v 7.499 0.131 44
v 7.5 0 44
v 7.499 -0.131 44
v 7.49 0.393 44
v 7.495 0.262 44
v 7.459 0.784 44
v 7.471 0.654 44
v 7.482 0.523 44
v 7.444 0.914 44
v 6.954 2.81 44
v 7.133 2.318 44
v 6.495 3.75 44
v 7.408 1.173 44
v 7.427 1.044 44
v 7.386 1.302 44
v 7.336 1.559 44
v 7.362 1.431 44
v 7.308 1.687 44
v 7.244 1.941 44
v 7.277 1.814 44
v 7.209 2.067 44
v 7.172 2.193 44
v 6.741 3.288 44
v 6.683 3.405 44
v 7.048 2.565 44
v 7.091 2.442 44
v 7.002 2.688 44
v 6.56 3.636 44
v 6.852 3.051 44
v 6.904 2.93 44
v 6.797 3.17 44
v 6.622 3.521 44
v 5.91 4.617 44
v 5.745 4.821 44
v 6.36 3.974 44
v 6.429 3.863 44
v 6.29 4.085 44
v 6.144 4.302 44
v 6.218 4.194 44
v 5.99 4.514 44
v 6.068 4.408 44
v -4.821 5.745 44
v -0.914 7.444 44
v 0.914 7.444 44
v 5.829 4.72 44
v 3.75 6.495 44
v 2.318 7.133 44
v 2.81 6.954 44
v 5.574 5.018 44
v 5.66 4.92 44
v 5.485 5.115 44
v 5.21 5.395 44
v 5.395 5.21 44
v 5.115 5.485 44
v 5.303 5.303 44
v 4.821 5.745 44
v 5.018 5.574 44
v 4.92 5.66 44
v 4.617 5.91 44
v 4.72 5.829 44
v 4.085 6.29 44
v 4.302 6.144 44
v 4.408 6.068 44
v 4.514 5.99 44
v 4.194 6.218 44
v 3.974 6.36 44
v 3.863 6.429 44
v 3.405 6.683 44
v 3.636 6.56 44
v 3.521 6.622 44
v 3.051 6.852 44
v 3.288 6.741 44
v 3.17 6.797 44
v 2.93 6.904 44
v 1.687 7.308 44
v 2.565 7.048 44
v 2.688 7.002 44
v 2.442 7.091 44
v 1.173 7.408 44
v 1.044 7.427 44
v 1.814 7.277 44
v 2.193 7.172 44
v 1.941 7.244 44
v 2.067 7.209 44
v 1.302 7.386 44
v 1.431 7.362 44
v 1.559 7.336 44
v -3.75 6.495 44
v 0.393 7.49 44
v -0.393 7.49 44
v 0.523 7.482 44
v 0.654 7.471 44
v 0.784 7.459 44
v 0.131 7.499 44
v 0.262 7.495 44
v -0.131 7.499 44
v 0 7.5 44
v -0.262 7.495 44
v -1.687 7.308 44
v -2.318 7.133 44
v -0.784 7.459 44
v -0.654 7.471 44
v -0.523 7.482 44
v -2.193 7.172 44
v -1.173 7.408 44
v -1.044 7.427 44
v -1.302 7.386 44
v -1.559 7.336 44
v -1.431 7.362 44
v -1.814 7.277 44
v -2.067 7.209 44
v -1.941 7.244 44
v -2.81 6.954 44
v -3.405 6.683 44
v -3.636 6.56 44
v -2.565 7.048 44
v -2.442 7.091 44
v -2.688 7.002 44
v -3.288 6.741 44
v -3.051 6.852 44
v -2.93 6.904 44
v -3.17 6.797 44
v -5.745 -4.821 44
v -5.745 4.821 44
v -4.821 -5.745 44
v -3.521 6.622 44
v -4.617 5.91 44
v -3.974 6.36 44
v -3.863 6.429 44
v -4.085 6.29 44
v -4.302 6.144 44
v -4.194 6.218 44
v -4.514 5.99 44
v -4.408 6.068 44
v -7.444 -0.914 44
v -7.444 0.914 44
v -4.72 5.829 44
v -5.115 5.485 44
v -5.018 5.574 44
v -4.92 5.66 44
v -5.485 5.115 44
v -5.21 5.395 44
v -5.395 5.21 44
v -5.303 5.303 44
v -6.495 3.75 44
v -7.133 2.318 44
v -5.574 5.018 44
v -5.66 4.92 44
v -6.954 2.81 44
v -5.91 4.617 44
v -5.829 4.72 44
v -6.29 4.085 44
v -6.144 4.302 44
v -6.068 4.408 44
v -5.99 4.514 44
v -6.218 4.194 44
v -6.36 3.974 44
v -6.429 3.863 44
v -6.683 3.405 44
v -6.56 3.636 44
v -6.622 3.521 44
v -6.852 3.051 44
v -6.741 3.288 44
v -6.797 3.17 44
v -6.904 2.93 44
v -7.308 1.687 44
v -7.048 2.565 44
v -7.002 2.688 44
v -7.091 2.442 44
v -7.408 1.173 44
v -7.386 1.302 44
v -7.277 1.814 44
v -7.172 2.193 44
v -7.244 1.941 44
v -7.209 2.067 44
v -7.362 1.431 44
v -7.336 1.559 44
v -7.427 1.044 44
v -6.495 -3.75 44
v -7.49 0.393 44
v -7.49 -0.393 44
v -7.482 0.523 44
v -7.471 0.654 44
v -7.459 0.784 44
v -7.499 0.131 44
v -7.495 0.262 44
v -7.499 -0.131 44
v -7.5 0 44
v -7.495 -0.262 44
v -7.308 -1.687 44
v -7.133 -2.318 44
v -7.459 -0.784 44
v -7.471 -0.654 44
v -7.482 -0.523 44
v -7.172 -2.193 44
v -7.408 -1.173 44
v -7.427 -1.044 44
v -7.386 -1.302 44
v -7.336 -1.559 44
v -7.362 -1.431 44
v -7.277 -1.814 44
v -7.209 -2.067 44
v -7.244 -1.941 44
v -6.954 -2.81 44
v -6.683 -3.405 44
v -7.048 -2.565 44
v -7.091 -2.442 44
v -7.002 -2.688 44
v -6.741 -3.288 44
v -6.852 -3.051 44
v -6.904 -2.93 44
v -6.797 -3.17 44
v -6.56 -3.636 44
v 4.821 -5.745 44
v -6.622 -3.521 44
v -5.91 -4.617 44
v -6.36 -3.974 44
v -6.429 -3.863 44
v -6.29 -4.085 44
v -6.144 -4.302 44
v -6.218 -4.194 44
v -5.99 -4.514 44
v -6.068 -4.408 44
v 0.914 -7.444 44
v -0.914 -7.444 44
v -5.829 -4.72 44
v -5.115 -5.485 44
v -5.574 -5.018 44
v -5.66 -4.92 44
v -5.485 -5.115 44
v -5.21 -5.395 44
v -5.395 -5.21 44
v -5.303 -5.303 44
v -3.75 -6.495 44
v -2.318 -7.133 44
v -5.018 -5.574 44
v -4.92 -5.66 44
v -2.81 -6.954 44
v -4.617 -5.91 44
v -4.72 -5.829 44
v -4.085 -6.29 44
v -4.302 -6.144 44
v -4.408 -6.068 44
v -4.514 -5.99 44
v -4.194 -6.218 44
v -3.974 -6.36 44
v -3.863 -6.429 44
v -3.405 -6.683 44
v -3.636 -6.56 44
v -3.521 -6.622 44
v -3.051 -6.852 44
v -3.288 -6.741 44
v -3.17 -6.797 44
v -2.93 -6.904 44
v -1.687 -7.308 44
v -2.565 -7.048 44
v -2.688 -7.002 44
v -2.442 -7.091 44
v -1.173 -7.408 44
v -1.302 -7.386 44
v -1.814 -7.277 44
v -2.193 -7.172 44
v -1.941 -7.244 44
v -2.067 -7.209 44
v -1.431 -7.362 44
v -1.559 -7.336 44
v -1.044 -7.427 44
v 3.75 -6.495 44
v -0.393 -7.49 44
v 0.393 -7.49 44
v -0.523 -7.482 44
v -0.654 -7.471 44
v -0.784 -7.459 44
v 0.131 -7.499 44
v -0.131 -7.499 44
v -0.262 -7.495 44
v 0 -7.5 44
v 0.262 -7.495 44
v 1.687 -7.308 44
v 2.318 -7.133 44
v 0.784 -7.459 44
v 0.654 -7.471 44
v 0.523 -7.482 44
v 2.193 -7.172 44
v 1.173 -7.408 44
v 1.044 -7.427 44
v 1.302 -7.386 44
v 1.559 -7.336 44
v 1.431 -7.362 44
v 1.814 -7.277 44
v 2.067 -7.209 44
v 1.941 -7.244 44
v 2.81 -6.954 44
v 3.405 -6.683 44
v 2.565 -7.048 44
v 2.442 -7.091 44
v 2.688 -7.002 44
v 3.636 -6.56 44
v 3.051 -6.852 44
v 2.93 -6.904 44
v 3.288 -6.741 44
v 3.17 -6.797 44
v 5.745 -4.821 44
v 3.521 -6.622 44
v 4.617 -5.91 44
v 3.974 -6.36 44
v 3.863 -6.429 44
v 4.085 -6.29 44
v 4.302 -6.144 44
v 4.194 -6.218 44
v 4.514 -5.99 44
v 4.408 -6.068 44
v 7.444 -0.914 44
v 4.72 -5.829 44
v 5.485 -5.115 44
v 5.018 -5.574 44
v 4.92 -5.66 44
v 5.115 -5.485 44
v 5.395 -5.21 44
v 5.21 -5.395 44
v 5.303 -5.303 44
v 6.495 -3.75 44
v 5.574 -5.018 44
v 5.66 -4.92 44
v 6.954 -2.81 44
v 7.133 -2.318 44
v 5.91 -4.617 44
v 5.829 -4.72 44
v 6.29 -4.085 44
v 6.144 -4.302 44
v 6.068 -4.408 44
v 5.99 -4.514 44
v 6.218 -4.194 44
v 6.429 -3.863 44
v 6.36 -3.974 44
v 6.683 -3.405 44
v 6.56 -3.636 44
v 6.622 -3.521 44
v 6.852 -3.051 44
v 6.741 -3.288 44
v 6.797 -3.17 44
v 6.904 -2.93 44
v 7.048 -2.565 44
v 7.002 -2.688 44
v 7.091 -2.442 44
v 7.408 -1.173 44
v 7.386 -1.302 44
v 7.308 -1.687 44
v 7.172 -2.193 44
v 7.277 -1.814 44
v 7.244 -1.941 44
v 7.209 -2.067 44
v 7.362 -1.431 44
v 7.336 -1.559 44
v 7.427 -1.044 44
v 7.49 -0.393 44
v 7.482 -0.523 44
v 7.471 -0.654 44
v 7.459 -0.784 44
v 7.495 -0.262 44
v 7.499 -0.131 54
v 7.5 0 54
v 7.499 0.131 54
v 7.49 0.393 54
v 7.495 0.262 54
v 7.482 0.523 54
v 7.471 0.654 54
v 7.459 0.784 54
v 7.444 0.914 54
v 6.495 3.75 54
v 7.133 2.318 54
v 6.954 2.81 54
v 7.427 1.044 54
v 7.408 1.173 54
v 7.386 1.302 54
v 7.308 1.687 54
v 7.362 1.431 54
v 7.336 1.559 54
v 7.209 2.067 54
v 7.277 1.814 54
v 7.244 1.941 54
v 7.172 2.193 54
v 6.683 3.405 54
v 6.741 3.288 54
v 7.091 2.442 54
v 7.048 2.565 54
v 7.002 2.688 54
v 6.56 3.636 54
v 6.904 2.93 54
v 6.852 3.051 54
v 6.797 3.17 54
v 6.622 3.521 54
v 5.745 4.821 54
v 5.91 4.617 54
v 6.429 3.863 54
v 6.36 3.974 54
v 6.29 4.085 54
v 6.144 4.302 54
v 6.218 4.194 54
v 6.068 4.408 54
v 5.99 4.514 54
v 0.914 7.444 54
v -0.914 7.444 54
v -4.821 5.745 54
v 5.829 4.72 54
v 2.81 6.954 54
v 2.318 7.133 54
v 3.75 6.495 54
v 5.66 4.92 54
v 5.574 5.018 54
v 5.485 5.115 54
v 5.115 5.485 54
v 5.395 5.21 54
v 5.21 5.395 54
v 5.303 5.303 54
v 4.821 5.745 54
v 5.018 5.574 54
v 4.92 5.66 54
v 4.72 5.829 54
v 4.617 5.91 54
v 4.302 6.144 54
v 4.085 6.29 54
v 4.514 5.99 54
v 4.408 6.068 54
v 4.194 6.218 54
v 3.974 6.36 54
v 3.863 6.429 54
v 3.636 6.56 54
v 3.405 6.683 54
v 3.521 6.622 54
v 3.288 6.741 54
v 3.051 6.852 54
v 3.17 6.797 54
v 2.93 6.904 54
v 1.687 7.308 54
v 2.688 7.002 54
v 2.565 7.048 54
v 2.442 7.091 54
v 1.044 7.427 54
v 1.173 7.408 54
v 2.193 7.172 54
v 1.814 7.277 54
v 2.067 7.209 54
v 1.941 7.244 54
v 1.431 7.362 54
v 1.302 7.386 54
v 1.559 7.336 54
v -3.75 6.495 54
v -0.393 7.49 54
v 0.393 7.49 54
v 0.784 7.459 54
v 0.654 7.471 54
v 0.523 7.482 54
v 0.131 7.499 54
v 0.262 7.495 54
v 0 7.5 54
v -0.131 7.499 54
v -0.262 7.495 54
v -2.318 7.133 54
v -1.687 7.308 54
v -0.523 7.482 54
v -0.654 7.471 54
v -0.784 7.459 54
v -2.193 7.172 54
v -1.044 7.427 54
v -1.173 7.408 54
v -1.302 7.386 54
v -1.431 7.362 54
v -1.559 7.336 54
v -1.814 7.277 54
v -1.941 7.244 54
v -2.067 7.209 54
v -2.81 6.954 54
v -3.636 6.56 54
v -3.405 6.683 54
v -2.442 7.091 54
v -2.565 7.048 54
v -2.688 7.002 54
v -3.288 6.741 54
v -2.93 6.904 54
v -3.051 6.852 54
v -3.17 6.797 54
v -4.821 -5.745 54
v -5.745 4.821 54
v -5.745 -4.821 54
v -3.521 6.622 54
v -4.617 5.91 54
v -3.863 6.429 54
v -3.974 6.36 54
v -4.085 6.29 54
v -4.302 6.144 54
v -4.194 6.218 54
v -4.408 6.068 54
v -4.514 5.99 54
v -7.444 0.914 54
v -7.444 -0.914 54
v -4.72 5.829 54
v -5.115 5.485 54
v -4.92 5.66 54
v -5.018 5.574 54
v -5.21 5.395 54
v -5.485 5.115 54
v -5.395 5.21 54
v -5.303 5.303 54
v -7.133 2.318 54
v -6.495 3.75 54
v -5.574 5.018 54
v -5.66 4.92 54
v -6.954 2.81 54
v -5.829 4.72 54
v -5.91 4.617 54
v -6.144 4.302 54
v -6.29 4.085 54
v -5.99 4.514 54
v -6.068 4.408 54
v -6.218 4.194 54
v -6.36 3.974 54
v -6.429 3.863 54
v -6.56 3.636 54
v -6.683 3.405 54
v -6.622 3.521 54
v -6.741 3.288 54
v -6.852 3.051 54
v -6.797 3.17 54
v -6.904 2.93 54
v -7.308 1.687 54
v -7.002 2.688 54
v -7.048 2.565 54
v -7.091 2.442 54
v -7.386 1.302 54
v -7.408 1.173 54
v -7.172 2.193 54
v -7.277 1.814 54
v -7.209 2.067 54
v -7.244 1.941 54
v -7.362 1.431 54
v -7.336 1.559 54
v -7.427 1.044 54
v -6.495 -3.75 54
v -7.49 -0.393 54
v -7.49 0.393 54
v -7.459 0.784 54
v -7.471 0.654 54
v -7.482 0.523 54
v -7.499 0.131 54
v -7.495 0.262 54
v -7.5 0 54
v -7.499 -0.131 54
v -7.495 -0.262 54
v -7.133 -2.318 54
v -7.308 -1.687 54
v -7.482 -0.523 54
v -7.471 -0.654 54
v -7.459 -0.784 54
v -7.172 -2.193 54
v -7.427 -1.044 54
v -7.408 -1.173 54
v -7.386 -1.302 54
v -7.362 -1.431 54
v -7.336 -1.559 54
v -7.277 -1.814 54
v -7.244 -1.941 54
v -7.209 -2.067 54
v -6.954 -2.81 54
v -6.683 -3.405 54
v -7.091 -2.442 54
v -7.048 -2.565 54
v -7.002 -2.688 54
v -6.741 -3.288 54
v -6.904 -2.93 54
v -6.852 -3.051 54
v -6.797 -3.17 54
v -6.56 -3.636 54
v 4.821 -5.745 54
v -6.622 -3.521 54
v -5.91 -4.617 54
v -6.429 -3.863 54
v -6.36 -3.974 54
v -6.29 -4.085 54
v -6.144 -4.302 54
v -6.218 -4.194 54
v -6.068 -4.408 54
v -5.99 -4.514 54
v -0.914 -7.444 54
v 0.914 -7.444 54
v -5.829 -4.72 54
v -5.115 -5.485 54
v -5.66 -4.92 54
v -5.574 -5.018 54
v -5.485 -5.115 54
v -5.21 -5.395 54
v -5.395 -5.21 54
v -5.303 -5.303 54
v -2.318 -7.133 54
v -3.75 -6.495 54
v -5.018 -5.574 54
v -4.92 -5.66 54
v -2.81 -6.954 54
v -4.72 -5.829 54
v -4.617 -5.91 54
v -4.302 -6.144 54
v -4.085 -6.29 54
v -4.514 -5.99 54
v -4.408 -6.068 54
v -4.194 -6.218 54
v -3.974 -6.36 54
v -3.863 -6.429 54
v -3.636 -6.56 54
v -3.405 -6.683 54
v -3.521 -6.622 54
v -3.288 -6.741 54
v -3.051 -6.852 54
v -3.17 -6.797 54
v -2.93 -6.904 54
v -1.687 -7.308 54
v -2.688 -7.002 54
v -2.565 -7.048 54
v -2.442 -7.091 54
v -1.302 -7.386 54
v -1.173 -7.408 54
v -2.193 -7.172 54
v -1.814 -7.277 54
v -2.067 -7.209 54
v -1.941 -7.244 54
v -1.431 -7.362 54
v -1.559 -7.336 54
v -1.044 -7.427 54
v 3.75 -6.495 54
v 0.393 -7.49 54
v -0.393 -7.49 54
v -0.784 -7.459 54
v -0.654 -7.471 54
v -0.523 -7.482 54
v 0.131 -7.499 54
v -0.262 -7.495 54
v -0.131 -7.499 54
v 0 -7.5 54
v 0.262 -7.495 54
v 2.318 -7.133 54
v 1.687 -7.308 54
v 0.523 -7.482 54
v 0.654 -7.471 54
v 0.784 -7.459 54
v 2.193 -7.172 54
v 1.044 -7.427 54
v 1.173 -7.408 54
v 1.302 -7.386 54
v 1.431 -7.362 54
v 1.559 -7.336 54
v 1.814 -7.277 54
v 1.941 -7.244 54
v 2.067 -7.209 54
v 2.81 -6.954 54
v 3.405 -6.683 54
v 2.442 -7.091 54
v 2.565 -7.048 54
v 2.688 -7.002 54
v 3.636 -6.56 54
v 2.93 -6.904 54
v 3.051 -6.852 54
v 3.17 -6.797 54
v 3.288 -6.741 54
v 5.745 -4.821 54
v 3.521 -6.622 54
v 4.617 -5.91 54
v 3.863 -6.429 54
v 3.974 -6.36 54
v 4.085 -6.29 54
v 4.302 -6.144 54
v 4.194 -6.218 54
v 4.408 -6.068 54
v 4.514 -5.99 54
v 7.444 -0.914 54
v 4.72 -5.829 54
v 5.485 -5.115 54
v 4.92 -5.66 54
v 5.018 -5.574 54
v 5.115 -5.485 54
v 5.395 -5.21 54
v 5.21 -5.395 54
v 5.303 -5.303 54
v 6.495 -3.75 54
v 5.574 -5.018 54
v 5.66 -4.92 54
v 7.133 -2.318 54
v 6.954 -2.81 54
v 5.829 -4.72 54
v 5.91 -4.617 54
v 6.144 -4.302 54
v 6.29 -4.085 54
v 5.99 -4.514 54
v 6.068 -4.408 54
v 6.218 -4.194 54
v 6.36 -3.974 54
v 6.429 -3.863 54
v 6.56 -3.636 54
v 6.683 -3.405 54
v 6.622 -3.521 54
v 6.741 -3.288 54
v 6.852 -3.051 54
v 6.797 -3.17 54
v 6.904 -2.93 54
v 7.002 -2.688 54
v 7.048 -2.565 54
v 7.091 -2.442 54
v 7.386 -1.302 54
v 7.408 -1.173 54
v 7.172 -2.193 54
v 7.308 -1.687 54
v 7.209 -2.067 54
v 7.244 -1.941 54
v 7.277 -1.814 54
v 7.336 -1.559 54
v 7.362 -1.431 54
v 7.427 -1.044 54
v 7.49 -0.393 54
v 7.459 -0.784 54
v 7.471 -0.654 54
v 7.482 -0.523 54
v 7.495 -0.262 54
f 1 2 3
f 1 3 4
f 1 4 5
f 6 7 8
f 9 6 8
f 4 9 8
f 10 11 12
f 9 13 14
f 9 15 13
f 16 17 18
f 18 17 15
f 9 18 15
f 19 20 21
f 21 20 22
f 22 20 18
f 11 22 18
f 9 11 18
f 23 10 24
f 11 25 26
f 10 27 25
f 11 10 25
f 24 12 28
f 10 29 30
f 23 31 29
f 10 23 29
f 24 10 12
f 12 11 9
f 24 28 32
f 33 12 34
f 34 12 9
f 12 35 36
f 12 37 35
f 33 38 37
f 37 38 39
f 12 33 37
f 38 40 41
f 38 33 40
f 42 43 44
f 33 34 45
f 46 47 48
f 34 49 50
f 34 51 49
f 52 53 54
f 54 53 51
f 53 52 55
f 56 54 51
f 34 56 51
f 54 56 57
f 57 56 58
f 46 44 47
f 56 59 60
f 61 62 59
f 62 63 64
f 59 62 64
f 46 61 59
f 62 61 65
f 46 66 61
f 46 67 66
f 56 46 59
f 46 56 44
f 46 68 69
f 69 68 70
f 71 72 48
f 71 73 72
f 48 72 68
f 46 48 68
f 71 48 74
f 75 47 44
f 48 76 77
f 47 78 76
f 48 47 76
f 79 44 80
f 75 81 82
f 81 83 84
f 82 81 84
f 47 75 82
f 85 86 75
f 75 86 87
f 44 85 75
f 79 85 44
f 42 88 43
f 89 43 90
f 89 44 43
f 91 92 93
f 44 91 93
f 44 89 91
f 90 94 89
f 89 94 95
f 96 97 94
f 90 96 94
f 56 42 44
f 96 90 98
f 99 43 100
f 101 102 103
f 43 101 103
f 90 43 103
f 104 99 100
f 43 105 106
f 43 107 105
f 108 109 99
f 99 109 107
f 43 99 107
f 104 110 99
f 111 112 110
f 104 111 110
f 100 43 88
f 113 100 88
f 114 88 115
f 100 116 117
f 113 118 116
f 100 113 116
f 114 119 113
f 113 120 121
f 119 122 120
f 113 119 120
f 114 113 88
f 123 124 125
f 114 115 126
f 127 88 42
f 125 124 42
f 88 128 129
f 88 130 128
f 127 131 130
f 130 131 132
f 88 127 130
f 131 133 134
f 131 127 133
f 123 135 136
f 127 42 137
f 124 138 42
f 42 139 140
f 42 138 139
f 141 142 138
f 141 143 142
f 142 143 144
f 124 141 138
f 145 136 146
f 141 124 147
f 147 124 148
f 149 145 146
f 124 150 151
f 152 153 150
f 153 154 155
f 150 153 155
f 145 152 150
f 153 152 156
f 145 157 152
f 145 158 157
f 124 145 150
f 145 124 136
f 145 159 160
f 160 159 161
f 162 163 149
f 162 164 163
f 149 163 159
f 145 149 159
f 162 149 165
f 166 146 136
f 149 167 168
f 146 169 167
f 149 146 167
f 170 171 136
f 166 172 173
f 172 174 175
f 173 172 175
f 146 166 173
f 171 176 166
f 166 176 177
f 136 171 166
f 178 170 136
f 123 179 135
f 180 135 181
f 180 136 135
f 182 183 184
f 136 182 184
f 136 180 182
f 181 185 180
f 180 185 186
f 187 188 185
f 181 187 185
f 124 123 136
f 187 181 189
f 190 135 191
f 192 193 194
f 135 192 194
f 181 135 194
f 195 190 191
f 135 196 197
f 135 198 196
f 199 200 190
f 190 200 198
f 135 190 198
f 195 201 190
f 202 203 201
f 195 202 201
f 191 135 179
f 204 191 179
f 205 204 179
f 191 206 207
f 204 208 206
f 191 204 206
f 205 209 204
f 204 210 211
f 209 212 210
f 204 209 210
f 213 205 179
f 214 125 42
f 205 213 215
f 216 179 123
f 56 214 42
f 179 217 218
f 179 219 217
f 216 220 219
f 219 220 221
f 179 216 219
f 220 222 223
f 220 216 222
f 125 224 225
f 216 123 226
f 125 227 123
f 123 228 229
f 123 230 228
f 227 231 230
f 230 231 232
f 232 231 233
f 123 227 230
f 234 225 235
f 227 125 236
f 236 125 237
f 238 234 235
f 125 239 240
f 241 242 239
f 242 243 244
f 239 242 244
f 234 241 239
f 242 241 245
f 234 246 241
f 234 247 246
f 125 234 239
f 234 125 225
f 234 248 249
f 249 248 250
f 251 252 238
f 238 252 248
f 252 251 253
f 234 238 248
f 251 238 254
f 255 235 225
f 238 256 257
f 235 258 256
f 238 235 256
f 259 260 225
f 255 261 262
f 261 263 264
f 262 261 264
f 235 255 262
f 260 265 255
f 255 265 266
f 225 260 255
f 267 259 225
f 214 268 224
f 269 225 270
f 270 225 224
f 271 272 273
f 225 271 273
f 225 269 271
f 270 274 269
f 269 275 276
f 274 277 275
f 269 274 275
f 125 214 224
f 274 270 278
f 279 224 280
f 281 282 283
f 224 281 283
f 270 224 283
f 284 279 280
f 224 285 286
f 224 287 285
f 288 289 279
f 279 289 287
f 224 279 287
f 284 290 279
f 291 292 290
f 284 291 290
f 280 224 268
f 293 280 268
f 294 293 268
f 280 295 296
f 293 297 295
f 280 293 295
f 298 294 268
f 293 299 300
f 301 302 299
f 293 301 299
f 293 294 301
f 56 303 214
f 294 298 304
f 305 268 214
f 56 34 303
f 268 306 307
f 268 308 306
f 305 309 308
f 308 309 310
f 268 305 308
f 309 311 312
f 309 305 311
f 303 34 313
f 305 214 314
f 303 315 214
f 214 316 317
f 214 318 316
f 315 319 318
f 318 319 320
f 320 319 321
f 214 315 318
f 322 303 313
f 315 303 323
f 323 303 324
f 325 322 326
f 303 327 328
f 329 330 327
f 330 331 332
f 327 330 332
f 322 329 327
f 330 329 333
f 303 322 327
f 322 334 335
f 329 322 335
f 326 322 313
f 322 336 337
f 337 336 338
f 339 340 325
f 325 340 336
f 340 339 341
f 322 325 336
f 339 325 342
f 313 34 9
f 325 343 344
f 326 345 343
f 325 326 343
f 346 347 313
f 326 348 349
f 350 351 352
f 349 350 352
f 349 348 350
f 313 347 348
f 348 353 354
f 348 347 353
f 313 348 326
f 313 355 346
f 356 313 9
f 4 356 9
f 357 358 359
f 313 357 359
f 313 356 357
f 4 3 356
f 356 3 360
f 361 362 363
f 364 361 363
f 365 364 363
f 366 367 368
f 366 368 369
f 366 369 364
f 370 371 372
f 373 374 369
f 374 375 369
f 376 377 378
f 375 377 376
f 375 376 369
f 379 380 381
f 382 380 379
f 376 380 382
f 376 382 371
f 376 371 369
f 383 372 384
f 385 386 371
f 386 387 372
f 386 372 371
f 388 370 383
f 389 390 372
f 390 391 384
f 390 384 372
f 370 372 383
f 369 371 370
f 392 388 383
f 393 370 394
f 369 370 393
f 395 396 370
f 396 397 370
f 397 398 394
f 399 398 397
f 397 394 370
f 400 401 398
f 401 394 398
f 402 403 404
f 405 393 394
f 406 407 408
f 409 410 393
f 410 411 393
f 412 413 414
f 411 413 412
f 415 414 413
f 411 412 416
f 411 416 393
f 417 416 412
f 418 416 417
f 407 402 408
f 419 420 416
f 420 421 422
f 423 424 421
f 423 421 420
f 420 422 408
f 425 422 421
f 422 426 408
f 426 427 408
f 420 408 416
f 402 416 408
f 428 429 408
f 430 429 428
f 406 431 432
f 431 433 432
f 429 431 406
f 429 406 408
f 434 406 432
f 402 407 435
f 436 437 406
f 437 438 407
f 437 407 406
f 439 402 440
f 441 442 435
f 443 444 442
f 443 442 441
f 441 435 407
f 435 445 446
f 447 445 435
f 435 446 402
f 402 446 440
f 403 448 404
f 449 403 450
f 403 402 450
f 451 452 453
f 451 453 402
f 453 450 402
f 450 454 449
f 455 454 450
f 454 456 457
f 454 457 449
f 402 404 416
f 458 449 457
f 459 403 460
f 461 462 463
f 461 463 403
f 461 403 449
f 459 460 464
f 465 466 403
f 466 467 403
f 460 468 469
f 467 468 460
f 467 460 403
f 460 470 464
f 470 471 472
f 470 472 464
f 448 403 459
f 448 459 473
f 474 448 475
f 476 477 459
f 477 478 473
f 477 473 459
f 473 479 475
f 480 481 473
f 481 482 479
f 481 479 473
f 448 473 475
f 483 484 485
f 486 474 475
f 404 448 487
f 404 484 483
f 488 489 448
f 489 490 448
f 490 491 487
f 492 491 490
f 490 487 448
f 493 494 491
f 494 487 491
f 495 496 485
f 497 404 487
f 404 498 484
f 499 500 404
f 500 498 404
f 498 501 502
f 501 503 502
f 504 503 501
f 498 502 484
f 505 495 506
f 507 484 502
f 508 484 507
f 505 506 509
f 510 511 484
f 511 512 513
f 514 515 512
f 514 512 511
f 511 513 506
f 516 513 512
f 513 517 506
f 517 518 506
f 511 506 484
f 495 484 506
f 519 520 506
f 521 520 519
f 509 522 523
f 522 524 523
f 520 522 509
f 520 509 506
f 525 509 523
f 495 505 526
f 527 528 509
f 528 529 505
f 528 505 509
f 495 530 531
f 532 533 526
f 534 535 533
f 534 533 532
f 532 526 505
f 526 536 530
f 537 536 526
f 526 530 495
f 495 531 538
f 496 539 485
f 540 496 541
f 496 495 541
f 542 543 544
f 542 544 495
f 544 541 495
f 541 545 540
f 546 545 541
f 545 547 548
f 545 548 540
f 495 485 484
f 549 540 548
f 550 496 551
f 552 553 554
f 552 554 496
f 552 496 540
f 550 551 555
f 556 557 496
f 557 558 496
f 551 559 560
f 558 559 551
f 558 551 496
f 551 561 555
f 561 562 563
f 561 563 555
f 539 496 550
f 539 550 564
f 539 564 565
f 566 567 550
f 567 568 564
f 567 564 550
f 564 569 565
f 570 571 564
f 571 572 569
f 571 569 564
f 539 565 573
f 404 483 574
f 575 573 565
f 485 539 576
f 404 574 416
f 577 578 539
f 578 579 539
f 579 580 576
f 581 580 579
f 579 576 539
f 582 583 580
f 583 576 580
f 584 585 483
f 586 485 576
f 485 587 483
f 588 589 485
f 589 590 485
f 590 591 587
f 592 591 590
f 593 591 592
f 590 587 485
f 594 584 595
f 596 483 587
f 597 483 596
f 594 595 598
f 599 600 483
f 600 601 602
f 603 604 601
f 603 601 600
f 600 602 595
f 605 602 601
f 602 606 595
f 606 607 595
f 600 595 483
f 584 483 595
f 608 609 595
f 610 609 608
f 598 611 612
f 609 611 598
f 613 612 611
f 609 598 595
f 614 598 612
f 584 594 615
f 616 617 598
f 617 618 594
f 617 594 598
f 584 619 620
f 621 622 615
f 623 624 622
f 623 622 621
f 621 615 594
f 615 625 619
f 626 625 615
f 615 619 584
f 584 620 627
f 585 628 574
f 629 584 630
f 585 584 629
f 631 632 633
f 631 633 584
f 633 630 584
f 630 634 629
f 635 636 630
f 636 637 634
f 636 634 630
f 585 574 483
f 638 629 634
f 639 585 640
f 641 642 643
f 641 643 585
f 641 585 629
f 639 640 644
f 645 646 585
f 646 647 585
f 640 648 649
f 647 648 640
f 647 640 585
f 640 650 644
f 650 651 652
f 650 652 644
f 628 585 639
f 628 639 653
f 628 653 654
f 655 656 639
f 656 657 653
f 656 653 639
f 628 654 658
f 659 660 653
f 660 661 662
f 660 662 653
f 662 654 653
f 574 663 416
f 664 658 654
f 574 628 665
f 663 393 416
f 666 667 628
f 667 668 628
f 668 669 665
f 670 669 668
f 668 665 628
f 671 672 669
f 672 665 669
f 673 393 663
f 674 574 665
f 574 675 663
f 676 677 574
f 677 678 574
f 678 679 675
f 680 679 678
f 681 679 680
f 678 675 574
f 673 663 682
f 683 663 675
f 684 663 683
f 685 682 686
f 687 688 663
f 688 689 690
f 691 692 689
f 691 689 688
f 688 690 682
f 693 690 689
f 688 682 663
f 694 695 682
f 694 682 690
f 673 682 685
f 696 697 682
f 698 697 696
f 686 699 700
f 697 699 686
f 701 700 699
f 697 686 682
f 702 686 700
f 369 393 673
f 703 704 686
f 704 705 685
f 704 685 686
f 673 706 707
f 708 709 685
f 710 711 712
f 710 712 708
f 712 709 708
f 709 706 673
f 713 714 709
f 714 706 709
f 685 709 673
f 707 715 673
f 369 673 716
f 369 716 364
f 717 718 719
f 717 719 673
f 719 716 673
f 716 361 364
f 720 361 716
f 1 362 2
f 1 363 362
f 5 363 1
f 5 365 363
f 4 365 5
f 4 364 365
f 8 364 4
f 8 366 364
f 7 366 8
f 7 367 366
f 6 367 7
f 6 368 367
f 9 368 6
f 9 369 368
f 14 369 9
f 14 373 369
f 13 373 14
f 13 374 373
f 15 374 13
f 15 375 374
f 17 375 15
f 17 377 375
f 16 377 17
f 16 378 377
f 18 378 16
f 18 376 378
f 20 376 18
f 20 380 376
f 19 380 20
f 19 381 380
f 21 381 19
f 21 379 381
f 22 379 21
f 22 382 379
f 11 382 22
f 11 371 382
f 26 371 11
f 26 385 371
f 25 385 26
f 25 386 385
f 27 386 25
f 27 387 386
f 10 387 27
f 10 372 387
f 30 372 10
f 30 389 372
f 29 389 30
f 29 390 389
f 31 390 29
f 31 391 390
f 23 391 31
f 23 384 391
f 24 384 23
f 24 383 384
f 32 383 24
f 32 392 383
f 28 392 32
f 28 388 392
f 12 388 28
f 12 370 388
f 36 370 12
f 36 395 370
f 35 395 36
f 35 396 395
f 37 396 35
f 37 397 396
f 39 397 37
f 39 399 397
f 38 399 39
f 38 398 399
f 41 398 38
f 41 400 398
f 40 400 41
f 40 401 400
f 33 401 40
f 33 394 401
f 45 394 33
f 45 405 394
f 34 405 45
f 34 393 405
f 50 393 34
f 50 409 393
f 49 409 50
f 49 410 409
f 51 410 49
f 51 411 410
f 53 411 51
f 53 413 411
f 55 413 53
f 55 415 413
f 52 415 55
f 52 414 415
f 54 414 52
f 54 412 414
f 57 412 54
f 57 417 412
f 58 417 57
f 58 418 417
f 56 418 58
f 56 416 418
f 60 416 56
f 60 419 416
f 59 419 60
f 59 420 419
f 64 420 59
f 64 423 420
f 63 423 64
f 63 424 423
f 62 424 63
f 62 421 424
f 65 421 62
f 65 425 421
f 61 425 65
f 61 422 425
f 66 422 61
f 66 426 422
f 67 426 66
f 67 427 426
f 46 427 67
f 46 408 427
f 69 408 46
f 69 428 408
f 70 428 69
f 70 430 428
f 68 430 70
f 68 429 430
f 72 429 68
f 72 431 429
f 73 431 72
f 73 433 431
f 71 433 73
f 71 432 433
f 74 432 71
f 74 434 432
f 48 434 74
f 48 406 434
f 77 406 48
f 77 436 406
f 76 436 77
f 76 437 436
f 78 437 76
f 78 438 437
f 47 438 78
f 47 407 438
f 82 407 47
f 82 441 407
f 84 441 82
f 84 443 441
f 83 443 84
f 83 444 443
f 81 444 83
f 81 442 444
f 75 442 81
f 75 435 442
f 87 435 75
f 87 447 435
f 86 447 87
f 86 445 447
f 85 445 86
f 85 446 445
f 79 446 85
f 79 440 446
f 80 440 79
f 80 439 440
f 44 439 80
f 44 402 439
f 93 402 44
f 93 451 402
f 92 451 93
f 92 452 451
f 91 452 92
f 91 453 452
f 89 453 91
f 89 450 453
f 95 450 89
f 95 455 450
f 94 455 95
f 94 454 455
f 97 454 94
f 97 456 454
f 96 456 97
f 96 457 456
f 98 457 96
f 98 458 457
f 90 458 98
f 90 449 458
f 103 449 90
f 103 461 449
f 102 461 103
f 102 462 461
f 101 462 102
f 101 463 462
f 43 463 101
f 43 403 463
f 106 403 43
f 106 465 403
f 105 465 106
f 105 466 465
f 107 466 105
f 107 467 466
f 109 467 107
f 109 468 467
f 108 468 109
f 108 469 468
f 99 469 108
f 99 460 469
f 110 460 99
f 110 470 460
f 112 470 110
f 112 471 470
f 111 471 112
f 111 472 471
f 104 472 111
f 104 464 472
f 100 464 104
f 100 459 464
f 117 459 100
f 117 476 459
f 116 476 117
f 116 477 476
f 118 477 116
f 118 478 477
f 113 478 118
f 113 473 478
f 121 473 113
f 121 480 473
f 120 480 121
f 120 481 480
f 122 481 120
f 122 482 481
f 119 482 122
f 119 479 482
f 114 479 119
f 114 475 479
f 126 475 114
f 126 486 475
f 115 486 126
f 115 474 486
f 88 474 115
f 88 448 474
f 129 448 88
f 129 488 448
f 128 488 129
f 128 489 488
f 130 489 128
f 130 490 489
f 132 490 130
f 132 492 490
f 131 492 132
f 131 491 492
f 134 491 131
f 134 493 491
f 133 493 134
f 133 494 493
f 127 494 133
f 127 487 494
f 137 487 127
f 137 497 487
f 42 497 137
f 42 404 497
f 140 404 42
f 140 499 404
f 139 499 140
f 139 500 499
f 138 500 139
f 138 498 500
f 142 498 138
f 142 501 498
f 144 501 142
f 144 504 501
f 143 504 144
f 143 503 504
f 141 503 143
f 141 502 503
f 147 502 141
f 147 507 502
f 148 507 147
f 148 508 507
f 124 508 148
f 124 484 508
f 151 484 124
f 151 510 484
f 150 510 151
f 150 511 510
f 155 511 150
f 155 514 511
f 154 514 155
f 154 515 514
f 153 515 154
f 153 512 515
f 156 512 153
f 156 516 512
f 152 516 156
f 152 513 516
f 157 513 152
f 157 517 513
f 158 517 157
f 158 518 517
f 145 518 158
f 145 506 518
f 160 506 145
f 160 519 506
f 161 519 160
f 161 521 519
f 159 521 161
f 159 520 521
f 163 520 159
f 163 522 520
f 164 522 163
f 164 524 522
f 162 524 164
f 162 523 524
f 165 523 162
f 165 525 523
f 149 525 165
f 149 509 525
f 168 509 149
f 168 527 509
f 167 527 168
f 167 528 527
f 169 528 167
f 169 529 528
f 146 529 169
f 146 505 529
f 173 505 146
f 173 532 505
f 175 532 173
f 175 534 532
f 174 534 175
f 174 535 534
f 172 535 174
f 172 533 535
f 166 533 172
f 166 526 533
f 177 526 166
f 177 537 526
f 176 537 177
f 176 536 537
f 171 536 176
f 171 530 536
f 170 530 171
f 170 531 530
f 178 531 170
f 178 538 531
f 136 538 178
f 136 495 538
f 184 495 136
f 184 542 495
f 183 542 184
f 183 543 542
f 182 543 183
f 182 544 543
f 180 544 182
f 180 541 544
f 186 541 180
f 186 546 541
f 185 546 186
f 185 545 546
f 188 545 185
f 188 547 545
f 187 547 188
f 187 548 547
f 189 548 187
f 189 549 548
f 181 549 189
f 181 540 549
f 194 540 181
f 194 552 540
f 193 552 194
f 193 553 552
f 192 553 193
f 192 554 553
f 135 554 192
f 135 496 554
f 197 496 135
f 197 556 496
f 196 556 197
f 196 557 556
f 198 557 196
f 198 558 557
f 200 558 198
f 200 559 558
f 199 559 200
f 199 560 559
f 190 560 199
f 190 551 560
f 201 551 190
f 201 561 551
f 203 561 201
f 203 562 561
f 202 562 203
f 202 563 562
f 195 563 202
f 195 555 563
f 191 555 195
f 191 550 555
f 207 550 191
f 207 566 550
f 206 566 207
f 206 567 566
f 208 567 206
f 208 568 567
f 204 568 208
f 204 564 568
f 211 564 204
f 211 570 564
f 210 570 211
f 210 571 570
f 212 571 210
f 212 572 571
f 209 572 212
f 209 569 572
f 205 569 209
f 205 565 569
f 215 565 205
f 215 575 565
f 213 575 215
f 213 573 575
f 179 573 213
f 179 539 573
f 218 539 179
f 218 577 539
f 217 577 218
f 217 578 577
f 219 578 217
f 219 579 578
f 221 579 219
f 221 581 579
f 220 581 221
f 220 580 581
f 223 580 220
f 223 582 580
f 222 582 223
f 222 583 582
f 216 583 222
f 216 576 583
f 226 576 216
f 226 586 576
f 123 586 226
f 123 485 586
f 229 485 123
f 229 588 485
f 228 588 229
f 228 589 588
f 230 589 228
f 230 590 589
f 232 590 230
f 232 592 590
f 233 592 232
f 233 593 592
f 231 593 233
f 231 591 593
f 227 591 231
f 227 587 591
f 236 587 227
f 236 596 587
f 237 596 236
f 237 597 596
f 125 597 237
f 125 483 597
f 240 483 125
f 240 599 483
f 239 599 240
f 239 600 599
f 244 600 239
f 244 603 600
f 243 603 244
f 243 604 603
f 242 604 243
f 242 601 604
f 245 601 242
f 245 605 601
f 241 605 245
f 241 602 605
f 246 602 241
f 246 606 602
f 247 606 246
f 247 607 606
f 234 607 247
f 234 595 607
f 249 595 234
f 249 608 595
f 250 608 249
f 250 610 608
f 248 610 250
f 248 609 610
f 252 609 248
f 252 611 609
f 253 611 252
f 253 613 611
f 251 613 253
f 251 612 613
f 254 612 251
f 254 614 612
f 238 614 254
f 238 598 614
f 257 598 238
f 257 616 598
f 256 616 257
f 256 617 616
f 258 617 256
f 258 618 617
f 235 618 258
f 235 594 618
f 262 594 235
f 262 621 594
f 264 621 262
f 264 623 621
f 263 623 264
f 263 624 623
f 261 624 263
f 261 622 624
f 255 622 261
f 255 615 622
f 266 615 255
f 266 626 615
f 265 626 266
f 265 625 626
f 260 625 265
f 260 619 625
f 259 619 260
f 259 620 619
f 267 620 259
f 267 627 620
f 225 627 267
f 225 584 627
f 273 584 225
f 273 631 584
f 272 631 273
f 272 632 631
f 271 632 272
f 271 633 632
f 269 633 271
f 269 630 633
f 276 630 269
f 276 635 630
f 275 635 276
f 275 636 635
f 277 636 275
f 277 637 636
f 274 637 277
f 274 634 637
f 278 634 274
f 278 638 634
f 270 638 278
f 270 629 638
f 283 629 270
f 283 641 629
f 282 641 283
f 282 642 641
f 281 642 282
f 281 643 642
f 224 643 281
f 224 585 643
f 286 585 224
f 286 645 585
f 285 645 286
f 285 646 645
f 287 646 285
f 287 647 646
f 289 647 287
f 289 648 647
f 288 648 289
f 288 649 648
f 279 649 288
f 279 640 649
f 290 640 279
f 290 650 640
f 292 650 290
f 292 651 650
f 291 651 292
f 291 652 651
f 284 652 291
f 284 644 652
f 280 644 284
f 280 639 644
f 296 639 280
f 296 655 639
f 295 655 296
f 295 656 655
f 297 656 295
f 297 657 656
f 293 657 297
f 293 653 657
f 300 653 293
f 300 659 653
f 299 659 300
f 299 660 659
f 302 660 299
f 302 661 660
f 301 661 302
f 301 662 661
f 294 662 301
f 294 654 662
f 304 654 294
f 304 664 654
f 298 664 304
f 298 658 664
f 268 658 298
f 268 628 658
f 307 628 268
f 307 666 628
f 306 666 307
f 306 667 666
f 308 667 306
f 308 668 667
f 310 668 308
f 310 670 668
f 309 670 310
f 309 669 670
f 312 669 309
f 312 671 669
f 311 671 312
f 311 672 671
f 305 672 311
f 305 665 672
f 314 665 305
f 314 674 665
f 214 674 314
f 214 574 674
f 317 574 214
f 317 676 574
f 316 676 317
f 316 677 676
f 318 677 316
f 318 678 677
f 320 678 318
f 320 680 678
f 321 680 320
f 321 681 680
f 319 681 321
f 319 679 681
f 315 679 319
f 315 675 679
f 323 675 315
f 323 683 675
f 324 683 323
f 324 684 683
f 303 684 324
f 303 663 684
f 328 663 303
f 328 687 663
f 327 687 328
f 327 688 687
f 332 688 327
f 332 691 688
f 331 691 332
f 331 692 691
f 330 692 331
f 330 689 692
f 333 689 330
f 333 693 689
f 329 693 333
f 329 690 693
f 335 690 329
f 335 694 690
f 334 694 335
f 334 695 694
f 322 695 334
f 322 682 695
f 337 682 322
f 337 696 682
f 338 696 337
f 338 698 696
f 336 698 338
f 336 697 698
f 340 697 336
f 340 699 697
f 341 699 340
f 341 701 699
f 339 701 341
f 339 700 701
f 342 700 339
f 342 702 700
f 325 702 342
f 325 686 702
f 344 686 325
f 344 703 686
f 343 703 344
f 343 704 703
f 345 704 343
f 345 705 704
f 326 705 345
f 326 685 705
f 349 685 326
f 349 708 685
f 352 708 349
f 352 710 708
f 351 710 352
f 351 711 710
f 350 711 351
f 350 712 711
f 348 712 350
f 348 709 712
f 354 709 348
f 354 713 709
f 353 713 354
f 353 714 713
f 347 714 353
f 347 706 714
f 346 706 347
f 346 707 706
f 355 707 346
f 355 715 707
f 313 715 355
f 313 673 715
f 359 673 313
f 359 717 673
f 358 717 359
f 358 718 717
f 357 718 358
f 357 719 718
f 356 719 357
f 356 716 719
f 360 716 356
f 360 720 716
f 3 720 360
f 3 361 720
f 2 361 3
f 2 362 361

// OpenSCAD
// file: ../utils/misc.scad
module rounded_rectangle(width, height, corner_radius, center = false) {

    x_offset = center ? -width/2 : 0;
    y_offset = center ? -height/2 : 0;

    corners_points = [
            [corner_radius, corner_radius],
            [width - corner_radius, corner_radius],
            [width - corner_radius, height - corner_radius],
            [corner_radius, height - corner_radius],
        ];

    hull() {
        for (p = corners_points) {
            translate([p.x + x_offset, p.y + y_offset, -1])
                circle(corner_radius);
        }
    }
}


module circle_segment(radius, cut_off_height) {
    intersection() {
        translate([0, -cut_off_height]) {
            circle(radius);
        }
        translate([-radius, 0]) {
            square([radius * 2, cut_off_height * 2]);
        }
    }
}

module tear_drop_circle(d) {
    r = d / 2;
    angle = 30;
    offset_y = r / 2;
    offset_x = cos(angle) * r;

    triangle_points = [
            [-offset_x, r / 2],
            [offset_x, r / 2],
            [0, 3 / 2 * r]
        ];

    polygon(triangle_points);
    circle(d = d);

}
// main file
include <../utils/misc.scad>

$fn = 360;

inner_diameter = 162;
inner_radius = inner_diameter / 2;
inner_height = 40;
thickness = 4;
outer_diameter = inner_diameter + thickness;
outer_radius = outer_diameter / 2;
fillet_radius_top = 2;
fillet_radius_bottom = 1;

solid();

module solid() {
    shell();
    handle();
}

module shell() {
    rotate_extrude(360) {
        hull() {
            translate([0, inner_height]) {
                square(thickness);
            }
            translate([inner_radius + thickness / 2, inner_height + thickness / 2]) {
                circle(d = thickness);
            }
        }

        hull() {
            translate([inner_radius + thickness / 2, inner_height + thickness / 2]) {
                circle(d = thickness);
            }
            translate([inner_radius + fillet_radius_bottom, fillet_radius_bottom]) {
                circle(fillet_radius_bottom);
            }
            translate([outer_radius + fillet_radius_bottom, fillet_radius_bottom]) {
                circle(fillet_radius_bottom);
            }
        }
    }
}

module handle() {
    translate([0, 0, inner_height + thickness]) {
        // stick
        translate([0, 0, 0]) {
            linear_extrude(10) {
                circle(d = 15);
            }
        }

        // knob
        translate([0, 0, 10]) {
            rotate_extrude(360) {
                hull() {
                    translate([0, -15/2]) {
                        square([10, 15]);
                    }
                    translate([10, 0]) {
                        circle(d = 15);
                    }
                }
            }
        }
    }
}
